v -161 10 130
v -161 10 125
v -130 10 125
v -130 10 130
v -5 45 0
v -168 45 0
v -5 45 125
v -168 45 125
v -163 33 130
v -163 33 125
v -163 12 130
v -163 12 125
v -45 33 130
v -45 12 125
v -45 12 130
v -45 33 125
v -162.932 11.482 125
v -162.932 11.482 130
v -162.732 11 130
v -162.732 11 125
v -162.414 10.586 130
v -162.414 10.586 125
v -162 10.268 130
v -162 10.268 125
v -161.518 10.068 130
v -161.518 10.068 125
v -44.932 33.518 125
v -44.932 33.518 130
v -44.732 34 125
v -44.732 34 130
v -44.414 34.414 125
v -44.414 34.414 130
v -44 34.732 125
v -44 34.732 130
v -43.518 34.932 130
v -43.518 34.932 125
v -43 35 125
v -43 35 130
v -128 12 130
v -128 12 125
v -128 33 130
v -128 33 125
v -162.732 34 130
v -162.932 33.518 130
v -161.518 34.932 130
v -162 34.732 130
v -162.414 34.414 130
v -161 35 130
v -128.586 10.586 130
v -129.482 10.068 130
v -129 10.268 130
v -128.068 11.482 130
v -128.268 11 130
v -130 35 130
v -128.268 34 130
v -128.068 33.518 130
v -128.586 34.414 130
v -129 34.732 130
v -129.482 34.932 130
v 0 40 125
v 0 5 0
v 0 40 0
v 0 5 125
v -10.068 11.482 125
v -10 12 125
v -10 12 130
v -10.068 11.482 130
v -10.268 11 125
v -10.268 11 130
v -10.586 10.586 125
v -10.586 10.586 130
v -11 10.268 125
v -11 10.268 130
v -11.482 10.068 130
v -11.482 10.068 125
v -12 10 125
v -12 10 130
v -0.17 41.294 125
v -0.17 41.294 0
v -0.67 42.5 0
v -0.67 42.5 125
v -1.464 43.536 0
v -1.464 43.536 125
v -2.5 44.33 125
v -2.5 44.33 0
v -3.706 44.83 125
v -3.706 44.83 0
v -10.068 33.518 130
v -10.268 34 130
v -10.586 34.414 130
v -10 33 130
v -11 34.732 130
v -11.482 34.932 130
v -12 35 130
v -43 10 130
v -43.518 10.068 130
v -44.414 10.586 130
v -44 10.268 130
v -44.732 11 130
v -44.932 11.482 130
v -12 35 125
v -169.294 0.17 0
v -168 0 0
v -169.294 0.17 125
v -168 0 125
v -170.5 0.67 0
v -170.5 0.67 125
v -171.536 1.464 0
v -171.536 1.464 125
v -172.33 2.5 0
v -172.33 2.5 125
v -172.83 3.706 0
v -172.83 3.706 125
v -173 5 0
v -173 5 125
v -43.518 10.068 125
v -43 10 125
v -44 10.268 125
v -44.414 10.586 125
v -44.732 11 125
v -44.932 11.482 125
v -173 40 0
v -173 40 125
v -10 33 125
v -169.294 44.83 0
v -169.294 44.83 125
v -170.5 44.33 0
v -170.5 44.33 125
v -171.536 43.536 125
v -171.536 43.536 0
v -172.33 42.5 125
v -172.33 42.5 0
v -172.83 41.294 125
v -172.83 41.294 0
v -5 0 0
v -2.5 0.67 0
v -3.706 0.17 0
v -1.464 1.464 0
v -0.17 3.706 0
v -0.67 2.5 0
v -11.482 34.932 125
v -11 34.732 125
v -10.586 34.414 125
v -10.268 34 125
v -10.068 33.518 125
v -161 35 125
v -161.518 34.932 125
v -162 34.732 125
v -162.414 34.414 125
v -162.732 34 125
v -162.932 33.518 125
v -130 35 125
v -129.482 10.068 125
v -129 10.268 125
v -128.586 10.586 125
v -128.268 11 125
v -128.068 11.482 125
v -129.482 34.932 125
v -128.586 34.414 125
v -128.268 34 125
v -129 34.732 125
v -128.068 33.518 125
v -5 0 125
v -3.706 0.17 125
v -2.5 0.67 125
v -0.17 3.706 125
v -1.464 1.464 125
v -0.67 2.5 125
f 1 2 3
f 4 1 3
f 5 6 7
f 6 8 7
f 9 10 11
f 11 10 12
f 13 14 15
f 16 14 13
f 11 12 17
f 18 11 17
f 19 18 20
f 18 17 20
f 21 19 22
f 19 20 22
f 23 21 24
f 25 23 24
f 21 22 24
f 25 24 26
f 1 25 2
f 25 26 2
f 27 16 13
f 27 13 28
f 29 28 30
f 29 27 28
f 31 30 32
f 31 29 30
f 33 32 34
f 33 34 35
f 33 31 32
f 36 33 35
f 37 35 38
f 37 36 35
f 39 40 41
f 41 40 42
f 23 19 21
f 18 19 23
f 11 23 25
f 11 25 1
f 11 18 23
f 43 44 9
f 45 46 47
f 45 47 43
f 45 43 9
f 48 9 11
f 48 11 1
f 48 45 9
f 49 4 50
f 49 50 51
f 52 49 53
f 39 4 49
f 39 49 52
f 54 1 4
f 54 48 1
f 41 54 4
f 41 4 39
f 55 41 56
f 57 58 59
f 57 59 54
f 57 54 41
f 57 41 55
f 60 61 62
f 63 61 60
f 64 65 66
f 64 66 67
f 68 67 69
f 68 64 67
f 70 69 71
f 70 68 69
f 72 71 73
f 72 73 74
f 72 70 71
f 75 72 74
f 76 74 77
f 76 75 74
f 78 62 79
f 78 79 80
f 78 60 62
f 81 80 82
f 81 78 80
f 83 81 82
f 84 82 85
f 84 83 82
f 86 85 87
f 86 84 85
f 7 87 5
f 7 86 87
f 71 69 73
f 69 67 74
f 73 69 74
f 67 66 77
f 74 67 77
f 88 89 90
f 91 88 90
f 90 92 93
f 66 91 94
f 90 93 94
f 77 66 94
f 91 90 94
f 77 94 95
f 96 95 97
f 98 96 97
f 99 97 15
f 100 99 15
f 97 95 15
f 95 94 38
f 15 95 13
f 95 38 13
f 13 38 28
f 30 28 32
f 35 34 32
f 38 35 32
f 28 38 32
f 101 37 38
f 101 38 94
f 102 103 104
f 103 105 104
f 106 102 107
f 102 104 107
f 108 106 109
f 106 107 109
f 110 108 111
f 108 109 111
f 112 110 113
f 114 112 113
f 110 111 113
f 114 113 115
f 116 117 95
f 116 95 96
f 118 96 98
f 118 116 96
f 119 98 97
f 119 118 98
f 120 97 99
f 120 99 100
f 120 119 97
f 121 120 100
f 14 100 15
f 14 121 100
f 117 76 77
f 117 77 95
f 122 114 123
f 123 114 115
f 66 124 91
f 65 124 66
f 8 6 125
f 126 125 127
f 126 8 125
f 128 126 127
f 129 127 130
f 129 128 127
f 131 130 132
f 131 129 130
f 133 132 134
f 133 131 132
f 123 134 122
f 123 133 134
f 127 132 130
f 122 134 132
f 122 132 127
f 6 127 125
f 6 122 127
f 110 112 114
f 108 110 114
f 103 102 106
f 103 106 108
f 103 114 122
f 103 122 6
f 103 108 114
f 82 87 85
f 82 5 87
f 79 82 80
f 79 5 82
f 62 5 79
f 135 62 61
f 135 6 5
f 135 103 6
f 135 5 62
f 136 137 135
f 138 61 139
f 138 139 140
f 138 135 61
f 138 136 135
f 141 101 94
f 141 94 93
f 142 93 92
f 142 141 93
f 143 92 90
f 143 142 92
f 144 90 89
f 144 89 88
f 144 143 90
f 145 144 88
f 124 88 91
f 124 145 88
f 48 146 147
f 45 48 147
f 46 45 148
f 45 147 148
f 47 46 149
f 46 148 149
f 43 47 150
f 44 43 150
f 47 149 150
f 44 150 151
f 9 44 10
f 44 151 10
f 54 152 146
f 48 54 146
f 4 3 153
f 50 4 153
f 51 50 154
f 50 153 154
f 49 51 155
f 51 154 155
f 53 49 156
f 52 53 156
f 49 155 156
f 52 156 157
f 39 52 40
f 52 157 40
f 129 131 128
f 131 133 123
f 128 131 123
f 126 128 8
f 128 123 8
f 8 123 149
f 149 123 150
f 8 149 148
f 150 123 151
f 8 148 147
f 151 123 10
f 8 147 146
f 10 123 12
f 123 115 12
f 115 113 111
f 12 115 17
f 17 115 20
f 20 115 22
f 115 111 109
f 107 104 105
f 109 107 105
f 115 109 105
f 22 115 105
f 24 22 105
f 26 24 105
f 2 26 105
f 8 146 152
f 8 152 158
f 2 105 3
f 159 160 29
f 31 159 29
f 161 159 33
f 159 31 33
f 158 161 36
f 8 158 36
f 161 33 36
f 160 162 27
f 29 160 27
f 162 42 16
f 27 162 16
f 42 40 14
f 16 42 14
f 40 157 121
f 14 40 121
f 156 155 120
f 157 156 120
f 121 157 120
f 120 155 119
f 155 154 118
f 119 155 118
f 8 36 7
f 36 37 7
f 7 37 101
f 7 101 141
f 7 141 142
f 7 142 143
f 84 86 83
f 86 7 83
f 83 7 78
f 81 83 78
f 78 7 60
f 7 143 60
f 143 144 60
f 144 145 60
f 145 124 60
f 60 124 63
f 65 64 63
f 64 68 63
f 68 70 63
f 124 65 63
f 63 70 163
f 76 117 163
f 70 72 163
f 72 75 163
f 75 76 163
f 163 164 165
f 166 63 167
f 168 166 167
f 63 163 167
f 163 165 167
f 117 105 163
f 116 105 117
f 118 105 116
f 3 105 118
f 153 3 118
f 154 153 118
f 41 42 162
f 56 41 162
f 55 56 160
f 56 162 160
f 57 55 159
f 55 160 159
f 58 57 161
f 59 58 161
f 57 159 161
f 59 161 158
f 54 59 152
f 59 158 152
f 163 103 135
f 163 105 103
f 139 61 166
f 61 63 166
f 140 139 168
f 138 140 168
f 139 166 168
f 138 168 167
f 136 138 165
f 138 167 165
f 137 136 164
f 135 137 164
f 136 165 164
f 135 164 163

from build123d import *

# Parameters (mm, degrees)
F0_W     = 173
F0_H     = 125
F1_DEPTH = 45
F2_R     = 5
F3_R     = 5
F5_DEPTH = 5


# Not quite as in the source:
# - a pattern or mirror of a feature is missing from the dataset's text; its kind, count and spacing are read off the source's solid


with BuildPart() as f1:
    # F0 (on Front) → F1 (new body)
    with BuildSketch(Plane.XZ):
        with Locations((-86.5, 62.5)):
            Rectangle(F0_W, F0_H)
    extrude(amount=-F1_DEPTH)

    # F2
    f2_edges = [f1.edges().sort_by_distance(p)[0] for p in [
        (0, 0, 62.5),
    ]]
    fillet(f2_edges, radius=F2_R)

    # F3
    f3_edges = [f1.edges().sort_by_distance(p)[0] for p in [
        (0, 45, 62.5),
        (-173, 45, 62.5),
        (-173, 0, 62.5),
    ]]
    fillet(f3_edges, radius=F3_R)

    # F4 (on face) → F5 (join)
    with BuildSketch(Plane.XY.offset(125)):
        with BuildLine():
            Line((-130, 35), (-161, 35))
            ThreePointArc((-161, 35), (-162.4142135624, 34.4142135624), (-163, 33))
            Line((-163, 33), (-163, 12))
            ThreePointArc((-163, 12), (-162.4142135624, 10.5857864376), (-161, 10))
            Line((-161, 10), (-130, 10))
            ThreePointArc((-130, 10), (-128.5857864376, 10.5857864376), (-128, 12))
            Line((-128, 12), (-128, 33))
            ThreePointArc((-128, 33), (-128.5857864376, 34.4142135624), (-130, 35))
        make_face()
    f5 = extrude(amount=F5_DEPTH)

    # F5_copies: F5 across plane
    add(f5.mirror(Plane(origin=(-86.5, 0, 0), x_dir=(0, 0, 1), z_dir=(1, 0, 0))))


solid = f1.part
